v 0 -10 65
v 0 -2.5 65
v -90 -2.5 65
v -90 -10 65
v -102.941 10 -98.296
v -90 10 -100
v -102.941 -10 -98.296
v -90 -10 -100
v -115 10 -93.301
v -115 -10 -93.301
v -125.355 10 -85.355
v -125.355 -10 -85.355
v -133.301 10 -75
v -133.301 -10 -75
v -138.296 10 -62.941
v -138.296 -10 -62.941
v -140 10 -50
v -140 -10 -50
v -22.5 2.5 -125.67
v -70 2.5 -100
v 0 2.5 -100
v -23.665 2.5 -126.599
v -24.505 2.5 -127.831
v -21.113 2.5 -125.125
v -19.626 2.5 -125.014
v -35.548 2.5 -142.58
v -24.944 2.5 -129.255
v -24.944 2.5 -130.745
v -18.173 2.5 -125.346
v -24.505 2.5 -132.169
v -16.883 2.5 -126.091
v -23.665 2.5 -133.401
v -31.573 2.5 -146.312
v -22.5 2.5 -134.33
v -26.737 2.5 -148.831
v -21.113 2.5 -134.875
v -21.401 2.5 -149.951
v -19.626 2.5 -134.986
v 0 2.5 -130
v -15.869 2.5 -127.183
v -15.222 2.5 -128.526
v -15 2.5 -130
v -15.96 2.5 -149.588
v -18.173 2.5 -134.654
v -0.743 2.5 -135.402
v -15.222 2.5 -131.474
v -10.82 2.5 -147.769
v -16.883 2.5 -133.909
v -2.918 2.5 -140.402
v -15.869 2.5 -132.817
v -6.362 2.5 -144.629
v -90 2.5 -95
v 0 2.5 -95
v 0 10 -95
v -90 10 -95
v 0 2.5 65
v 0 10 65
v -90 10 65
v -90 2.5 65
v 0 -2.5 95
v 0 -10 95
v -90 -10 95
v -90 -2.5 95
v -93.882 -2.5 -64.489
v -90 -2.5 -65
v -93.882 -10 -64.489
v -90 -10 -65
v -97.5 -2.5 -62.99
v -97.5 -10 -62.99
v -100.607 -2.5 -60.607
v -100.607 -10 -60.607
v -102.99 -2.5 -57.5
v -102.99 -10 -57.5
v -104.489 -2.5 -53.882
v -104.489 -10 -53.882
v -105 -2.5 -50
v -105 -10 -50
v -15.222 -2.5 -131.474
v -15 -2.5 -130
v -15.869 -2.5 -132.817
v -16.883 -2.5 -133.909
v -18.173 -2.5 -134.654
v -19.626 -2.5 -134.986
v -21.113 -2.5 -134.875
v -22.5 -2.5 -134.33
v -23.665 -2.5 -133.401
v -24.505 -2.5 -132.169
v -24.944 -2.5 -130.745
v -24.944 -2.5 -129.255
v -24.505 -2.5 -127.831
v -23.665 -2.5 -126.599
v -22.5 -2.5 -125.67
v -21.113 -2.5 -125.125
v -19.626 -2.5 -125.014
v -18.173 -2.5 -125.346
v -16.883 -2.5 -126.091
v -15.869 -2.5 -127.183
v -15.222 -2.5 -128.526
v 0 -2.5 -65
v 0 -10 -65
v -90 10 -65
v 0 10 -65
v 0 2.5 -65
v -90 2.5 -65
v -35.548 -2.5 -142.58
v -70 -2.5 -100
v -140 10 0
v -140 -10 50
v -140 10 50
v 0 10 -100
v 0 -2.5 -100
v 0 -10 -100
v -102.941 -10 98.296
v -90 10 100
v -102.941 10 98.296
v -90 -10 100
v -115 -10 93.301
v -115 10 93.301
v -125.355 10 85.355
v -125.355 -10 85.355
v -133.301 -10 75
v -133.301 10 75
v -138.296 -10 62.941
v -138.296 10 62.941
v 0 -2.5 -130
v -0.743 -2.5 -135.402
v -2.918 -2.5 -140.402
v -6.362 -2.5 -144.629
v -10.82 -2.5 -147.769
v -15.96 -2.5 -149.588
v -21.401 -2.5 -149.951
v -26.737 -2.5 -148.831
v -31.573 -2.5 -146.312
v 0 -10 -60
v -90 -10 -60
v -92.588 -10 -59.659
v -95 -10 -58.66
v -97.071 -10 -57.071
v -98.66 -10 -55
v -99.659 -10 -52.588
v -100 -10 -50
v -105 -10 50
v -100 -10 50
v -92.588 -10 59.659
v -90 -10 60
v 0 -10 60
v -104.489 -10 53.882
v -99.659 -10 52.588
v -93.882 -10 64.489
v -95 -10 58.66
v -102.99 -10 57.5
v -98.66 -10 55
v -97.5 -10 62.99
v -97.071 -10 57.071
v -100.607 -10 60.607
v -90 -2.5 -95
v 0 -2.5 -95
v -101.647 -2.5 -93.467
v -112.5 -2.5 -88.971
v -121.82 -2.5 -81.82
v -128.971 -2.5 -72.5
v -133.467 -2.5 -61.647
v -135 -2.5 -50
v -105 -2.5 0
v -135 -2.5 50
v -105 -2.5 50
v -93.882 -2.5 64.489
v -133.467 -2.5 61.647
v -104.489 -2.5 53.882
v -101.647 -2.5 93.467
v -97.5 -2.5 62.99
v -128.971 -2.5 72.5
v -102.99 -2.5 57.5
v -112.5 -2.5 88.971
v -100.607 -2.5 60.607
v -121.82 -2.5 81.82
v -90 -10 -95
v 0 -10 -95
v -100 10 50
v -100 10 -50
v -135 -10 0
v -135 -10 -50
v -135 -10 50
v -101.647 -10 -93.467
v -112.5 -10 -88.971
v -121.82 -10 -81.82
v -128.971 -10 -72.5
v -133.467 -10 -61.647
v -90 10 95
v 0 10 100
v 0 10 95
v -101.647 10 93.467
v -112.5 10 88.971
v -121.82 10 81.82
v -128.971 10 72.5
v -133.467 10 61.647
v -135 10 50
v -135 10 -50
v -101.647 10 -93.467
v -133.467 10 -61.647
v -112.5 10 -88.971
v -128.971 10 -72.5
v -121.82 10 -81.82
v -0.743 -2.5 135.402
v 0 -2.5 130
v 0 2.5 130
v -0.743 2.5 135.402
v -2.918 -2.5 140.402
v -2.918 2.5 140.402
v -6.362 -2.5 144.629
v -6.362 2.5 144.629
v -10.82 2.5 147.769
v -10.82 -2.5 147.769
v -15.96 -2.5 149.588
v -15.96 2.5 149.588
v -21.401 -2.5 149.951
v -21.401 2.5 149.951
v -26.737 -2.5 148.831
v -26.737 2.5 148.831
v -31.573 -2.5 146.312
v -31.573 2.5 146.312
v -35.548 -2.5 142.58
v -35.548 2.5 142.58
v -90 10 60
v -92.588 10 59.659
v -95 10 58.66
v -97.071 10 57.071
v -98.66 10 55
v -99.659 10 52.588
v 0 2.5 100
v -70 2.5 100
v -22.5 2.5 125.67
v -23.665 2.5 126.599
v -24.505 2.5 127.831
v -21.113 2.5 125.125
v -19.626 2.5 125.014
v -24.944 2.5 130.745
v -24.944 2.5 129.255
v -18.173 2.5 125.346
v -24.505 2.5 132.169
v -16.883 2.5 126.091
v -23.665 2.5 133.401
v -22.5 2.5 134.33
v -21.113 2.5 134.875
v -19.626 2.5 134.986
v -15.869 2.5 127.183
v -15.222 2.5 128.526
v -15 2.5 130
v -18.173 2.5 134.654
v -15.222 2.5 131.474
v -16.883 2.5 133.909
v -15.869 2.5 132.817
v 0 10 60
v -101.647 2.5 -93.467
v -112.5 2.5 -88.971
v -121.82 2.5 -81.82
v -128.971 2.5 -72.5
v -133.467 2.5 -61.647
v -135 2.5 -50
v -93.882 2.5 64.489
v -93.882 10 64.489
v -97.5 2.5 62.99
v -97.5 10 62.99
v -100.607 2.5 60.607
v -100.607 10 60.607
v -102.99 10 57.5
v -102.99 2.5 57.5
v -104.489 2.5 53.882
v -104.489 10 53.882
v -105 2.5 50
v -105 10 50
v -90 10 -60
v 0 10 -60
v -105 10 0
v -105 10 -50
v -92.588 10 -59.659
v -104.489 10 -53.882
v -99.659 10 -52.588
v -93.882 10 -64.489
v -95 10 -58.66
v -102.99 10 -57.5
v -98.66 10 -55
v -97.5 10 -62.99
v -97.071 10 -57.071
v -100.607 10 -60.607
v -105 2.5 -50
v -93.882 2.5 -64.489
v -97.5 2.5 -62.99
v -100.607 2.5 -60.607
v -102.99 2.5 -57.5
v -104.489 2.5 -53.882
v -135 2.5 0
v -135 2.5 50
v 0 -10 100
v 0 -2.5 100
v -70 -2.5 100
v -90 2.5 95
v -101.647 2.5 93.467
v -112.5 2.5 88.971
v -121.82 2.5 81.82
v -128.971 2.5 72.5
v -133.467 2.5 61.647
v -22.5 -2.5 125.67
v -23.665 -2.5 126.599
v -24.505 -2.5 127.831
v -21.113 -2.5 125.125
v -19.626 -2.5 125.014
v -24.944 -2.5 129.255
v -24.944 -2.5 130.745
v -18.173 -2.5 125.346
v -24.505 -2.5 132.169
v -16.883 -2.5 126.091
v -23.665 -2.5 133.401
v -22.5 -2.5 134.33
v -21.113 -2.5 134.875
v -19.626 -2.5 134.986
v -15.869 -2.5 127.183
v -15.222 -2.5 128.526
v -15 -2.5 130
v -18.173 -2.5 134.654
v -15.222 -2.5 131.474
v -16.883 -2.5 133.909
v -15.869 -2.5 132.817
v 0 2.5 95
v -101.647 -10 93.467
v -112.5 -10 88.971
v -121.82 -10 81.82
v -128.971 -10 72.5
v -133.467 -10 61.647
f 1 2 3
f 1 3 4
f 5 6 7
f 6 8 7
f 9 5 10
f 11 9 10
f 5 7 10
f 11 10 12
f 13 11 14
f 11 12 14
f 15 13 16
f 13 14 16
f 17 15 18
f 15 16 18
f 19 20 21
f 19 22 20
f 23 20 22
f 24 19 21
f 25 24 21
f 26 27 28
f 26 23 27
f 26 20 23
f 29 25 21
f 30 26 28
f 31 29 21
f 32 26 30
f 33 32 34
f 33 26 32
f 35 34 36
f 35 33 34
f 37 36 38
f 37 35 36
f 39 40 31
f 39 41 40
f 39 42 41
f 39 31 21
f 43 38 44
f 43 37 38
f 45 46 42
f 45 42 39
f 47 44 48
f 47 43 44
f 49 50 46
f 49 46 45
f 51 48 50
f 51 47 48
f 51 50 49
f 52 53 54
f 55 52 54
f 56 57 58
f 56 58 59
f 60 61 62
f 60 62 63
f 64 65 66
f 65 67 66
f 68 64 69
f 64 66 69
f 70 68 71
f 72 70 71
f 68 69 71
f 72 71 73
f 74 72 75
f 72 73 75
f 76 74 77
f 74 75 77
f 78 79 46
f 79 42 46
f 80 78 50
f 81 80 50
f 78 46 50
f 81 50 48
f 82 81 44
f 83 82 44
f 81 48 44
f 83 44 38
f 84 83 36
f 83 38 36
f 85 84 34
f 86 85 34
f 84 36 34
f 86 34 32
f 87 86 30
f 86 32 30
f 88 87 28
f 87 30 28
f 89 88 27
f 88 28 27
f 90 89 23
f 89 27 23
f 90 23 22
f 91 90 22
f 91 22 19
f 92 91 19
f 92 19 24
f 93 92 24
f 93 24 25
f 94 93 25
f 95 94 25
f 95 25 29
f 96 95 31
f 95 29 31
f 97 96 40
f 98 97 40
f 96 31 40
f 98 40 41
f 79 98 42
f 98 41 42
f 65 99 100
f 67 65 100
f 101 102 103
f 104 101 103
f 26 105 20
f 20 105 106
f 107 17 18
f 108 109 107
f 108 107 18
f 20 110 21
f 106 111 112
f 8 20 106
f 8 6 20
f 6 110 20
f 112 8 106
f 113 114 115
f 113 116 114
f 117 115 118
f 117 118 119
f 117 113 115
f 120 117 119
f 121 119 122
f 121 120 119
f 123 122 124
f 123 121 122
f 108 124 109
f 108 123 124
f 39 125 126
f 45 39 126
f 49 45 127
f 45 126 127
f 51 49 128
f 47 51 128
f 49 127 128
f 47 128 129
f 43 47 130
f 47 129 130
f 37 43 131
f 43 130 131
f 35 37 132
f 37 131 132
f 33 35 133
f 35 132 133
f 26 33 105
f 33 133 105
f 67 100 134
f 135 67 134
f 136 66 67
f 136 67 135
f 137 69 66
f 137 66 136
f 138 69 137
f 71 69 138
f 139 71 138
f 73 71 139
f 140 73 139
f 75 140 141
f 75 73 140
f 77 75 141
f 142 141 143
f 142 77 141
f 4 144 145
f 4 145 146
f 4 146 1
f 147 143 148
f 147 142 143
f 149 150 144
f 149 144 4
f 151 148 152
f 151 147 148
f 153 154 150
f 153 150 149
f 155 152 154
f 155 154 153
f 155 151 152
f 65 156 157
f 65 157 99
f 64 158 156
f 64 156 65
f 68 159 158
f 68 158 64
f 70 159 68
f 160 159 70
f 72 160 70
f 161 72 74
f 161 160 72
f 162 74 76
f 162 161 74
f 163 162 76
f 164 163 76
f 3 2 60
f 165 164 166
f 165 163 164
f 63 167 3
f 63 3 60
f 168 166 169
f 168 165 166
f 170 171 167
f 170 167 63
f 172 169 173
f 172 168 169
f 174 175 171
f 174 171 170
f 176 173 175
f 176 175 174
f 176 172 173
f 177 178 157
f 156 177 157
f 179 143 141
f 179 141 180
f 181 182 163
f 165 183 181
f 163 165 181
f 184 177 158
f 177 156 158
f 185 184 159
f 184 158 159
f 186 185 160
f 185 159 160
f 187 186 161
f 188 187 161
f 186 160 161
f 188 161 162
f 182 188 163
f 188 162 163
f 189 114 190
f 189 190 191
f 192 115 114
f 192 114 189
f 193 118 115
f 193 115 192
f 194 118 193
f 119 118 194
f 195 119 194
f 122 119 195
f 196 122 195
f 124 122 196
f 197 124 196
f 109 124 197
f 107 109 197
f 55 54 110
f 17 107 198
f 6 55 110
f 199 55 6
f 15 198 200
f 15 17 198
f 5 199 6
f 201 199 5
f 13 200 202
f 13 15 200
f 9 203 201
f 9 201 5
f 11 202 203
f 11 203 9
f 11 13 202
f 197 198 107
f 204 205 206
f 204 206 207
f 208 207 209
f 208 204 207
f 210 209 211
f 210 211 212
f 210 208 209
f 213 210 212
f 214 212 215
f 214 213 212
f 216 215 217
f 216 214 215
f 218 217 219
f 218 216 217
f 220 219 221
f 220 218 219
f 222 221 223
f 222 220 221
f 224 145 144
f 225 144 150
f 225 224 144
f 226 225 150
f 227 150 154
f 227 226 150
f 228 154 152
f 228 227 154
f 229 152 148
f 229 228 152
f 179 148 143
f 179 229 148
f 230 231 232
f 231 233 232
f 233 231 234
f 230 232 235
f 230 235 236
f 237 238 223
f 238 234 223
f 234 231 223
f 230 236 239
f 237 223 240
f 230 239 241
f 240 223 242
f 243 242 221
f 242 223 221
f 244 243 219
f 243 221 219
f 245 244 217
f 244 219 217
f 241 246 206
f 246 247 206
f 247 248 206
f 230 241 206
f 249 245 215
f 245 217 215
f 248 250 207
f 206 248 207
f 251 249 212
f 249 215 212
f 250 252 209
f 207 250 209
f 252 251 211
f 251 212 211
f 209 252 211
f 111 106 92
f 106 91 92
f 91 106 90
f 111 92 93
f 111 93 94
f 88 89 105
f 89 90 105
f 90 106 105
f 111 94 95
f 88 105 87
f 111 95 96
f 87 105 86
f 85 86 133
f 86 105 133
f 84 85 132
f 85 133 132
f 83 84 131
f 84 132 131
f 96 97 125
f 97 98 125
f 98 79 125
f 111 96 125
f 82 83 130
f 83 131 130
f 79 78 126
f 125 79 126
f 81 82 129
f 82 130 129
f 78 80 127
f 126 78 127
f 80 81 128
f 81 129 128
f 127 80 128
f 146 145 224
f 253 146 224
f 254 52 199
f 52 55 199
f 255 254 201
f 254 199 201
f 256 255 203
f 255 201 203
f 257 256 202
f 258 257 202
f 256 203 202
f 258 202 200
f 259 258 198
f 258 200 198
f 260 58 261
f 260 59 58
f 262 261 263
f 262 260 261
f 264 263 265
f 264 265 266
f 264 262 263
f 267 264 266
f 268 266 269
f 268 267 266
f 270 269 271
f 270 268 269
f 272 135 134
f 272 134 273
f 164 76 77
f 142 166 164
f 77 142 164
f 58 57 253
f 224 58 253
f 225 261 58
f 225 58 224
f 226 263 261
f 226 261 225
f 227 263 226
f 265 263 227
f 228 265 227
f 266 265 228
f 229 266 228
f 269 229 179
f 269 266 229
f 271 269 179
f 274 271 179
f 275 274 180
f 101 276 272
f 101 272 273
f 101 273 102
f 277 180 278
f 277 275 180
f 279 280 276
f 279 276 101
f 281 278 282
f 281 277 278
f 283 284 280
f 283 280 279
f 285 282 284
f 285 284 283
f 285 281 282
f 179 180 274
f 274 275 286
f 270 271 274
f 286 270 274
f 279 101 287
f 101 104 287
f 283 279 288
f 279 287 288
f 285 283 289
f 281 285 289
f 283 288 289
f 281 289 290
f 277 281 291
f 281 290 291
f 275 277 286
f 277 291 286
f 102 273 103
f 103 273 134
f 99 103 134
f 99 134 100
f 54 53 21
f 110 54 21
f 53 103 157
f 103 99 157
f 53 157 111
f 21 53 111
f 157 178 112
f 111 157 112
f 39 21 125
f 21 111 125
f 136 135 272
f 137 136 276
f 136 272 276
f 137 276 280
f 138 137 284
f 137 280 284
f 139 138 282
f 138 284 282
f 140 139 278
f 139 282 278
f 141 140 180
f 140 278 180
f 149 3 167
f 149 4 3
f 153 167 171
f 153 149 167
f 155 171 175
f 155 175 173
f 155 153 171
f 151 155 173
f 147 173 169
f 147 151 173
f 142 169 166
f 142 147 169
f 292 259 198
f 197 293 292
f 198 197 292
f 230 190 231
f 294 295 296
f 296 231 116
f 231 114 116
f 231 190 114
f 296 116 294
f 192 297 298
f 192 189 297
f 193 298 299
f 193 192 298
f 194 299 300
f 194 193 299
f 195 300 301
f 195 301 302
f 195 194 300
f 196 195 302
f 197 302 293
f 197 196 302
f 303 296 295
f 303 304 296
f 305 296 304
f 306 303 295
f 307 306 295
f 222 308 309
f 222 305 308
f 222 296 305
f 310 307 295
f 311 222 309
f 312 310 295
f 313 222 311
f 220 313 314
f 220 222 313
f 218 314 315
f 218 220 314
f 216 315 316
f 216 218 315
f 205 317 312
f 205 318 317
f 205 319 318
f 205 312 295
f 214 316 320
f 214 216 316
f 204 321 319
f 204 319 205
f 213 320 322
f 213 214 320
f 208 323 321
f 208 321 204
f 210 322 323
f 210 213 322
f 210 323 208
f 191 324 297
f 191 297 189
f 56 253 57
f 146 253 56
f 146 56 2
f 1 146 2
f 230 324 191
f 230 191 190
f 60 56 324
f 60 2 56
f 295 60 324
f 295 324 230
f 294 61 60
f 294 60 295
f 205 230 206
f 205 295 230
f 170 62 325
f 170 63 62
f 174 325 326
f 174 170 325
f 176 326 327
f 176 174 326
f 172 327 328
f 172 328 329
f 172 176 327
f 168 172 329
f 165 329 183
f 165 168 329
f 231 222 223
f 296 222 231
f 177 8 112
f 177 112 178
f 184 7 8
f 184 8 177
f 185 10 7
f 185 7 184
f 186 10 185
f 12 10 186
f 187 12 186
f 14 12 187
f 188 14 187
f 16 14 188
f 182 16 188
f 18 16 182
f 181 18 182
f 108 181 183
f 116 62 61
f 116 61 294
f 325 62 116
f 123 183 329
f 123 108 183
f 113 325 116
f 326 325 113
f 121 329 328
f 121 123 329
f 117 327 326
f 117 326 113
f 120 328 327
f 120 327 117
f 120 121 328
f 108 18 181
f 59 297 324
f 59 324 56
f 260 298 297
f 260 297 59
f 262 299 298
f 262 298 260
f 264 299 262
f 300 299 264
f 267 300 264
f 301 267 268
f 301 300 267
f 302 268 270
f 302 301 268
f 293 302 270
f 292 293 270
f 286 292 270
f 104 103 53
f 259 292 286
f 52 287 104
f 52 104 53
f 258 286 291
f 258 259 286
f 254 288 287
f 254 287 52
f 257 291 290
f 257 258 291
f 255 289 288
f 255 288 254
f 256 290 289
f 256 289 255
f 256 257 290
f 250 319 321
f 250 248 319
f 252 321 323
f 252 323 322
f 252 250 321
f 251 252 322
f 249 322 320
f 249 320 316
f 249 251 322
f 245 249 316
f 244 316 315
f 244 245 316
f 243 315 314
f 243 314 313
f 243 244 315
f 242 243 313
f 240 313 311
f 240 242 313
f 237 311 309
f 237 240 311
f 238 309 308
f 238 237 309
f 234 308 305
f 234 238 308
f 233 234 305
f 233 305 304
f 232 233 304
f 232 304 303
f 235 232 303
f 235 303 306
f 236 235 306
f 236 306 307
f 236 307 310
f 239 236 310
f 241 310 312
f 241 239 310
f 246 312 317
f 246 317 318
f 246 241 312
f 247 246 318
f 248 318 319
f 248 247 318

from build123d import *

# Parameters (mm, degrees)
F3_R     = 5
F4_DEPTH = 2.5


with BuildPart() as f2:
    # F2: sweep along a path in F0
    with BuildLine(Plane.XZ) as f2_path:
        Line((0, 60), (-90, 60))
        ThreePointArc((-90, 60), (-97.071068, 57.071068), (-100, 50))
        Line((-100, 50), (-100, 0))
    # F1 (on Right) → F2 (sweep)
    with BuildSketch(Plane.YZ):
        Polygon((-10, 60), (0, 60), (10, 60), (10, 65), (2.5, 65), (2.5, 95), (10, 95), (10, 100), (0, 100), (-10, 100), (-10, 95), (-2.5, 95), (-2.5, 65), (-10, 65), align=None)
    sweep(path=f2_path.line)

    # F3 (on Front) → F4 (join, symmetric)
    with BuildSketch(Plane.XZ):
        with BuildLine():
            Line((-70, 100), (0, 100))
            Line((0, 100), (0, 130))
            ThreePointArc((0, 130), (-13.327703, 148.854189), (-35.548045, 142.580075))
            Line((-35.548045, 142.580075), (-70, 100))
        make_face()
        with Locations((-20, 130)):
            Circle(F3_R, mode=Mode.SUBTRACT)
    extrude(amount=F4_DEPTH, both=True)

    # F5: F2 across plane


with BuildPart() as f2_1:
    add(f2.part)
    add(f2.part.mirror(Plane.XY))


solid = f2_1.part
